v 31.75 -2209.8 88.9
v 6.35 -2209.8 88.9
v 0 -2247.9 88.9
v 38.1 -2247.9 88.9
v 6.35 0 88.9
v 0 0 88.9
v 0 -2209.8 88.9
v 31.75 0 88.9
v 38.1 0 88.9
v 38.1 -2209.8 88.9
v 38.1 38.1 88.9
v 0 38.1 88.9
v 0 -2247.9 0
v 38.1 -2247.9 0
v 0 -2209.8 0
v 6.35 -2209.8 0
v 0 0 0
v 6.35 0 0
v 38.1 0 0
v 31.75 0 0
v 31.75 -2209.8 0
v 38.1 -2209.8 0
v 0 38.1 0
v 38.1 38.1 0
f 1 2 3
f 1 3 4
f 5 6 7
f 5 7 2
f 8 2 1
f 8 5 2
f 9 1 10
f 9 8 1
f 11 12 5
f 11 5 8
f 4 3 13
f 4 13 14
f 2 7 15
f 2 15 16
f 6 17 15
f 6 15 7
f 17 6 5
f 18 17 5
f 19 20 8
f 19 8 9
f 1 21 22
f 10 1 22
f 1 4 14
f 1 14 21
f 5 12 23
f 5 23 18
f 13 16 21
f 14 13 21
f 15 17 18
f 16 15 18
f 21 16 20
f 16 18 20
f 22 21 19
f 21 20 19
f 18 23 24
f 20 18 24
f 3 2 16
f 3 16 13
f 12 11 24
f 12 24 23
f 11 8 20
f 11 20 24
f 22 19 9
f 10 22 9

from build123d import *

# Parameters (mm, degrees)
F0_W     = 38.1
F0_H     = 88.9
F1_DEPTH = 2209.8
F3_DEPTH = 88.9


with BuildPart() as f1:
    # F0 (on Front) → F1 (new body)
    with BuildSketch(Plane.XZ):
        with Locations((19.05, 44.45)):
            Rectangle(F0_W, F0_H)
    extrude(amount=F1_DEPTH)

    # F2 (on face) → F3 (join, through all)
    with BuildSketch(Plane.XY.offset(88.9)):
        Polygon((0, 38.1), (6.35, 0), (31.75, 0), (38.1, 38.1), align=None)
        Polygon((31.75, -2209.8), (6.35, -2209.8), (0, -2247.9), (38.1, -2247.9), align=None)
    extrude(amount=-F3_DEPTH)


solid = f1.part
